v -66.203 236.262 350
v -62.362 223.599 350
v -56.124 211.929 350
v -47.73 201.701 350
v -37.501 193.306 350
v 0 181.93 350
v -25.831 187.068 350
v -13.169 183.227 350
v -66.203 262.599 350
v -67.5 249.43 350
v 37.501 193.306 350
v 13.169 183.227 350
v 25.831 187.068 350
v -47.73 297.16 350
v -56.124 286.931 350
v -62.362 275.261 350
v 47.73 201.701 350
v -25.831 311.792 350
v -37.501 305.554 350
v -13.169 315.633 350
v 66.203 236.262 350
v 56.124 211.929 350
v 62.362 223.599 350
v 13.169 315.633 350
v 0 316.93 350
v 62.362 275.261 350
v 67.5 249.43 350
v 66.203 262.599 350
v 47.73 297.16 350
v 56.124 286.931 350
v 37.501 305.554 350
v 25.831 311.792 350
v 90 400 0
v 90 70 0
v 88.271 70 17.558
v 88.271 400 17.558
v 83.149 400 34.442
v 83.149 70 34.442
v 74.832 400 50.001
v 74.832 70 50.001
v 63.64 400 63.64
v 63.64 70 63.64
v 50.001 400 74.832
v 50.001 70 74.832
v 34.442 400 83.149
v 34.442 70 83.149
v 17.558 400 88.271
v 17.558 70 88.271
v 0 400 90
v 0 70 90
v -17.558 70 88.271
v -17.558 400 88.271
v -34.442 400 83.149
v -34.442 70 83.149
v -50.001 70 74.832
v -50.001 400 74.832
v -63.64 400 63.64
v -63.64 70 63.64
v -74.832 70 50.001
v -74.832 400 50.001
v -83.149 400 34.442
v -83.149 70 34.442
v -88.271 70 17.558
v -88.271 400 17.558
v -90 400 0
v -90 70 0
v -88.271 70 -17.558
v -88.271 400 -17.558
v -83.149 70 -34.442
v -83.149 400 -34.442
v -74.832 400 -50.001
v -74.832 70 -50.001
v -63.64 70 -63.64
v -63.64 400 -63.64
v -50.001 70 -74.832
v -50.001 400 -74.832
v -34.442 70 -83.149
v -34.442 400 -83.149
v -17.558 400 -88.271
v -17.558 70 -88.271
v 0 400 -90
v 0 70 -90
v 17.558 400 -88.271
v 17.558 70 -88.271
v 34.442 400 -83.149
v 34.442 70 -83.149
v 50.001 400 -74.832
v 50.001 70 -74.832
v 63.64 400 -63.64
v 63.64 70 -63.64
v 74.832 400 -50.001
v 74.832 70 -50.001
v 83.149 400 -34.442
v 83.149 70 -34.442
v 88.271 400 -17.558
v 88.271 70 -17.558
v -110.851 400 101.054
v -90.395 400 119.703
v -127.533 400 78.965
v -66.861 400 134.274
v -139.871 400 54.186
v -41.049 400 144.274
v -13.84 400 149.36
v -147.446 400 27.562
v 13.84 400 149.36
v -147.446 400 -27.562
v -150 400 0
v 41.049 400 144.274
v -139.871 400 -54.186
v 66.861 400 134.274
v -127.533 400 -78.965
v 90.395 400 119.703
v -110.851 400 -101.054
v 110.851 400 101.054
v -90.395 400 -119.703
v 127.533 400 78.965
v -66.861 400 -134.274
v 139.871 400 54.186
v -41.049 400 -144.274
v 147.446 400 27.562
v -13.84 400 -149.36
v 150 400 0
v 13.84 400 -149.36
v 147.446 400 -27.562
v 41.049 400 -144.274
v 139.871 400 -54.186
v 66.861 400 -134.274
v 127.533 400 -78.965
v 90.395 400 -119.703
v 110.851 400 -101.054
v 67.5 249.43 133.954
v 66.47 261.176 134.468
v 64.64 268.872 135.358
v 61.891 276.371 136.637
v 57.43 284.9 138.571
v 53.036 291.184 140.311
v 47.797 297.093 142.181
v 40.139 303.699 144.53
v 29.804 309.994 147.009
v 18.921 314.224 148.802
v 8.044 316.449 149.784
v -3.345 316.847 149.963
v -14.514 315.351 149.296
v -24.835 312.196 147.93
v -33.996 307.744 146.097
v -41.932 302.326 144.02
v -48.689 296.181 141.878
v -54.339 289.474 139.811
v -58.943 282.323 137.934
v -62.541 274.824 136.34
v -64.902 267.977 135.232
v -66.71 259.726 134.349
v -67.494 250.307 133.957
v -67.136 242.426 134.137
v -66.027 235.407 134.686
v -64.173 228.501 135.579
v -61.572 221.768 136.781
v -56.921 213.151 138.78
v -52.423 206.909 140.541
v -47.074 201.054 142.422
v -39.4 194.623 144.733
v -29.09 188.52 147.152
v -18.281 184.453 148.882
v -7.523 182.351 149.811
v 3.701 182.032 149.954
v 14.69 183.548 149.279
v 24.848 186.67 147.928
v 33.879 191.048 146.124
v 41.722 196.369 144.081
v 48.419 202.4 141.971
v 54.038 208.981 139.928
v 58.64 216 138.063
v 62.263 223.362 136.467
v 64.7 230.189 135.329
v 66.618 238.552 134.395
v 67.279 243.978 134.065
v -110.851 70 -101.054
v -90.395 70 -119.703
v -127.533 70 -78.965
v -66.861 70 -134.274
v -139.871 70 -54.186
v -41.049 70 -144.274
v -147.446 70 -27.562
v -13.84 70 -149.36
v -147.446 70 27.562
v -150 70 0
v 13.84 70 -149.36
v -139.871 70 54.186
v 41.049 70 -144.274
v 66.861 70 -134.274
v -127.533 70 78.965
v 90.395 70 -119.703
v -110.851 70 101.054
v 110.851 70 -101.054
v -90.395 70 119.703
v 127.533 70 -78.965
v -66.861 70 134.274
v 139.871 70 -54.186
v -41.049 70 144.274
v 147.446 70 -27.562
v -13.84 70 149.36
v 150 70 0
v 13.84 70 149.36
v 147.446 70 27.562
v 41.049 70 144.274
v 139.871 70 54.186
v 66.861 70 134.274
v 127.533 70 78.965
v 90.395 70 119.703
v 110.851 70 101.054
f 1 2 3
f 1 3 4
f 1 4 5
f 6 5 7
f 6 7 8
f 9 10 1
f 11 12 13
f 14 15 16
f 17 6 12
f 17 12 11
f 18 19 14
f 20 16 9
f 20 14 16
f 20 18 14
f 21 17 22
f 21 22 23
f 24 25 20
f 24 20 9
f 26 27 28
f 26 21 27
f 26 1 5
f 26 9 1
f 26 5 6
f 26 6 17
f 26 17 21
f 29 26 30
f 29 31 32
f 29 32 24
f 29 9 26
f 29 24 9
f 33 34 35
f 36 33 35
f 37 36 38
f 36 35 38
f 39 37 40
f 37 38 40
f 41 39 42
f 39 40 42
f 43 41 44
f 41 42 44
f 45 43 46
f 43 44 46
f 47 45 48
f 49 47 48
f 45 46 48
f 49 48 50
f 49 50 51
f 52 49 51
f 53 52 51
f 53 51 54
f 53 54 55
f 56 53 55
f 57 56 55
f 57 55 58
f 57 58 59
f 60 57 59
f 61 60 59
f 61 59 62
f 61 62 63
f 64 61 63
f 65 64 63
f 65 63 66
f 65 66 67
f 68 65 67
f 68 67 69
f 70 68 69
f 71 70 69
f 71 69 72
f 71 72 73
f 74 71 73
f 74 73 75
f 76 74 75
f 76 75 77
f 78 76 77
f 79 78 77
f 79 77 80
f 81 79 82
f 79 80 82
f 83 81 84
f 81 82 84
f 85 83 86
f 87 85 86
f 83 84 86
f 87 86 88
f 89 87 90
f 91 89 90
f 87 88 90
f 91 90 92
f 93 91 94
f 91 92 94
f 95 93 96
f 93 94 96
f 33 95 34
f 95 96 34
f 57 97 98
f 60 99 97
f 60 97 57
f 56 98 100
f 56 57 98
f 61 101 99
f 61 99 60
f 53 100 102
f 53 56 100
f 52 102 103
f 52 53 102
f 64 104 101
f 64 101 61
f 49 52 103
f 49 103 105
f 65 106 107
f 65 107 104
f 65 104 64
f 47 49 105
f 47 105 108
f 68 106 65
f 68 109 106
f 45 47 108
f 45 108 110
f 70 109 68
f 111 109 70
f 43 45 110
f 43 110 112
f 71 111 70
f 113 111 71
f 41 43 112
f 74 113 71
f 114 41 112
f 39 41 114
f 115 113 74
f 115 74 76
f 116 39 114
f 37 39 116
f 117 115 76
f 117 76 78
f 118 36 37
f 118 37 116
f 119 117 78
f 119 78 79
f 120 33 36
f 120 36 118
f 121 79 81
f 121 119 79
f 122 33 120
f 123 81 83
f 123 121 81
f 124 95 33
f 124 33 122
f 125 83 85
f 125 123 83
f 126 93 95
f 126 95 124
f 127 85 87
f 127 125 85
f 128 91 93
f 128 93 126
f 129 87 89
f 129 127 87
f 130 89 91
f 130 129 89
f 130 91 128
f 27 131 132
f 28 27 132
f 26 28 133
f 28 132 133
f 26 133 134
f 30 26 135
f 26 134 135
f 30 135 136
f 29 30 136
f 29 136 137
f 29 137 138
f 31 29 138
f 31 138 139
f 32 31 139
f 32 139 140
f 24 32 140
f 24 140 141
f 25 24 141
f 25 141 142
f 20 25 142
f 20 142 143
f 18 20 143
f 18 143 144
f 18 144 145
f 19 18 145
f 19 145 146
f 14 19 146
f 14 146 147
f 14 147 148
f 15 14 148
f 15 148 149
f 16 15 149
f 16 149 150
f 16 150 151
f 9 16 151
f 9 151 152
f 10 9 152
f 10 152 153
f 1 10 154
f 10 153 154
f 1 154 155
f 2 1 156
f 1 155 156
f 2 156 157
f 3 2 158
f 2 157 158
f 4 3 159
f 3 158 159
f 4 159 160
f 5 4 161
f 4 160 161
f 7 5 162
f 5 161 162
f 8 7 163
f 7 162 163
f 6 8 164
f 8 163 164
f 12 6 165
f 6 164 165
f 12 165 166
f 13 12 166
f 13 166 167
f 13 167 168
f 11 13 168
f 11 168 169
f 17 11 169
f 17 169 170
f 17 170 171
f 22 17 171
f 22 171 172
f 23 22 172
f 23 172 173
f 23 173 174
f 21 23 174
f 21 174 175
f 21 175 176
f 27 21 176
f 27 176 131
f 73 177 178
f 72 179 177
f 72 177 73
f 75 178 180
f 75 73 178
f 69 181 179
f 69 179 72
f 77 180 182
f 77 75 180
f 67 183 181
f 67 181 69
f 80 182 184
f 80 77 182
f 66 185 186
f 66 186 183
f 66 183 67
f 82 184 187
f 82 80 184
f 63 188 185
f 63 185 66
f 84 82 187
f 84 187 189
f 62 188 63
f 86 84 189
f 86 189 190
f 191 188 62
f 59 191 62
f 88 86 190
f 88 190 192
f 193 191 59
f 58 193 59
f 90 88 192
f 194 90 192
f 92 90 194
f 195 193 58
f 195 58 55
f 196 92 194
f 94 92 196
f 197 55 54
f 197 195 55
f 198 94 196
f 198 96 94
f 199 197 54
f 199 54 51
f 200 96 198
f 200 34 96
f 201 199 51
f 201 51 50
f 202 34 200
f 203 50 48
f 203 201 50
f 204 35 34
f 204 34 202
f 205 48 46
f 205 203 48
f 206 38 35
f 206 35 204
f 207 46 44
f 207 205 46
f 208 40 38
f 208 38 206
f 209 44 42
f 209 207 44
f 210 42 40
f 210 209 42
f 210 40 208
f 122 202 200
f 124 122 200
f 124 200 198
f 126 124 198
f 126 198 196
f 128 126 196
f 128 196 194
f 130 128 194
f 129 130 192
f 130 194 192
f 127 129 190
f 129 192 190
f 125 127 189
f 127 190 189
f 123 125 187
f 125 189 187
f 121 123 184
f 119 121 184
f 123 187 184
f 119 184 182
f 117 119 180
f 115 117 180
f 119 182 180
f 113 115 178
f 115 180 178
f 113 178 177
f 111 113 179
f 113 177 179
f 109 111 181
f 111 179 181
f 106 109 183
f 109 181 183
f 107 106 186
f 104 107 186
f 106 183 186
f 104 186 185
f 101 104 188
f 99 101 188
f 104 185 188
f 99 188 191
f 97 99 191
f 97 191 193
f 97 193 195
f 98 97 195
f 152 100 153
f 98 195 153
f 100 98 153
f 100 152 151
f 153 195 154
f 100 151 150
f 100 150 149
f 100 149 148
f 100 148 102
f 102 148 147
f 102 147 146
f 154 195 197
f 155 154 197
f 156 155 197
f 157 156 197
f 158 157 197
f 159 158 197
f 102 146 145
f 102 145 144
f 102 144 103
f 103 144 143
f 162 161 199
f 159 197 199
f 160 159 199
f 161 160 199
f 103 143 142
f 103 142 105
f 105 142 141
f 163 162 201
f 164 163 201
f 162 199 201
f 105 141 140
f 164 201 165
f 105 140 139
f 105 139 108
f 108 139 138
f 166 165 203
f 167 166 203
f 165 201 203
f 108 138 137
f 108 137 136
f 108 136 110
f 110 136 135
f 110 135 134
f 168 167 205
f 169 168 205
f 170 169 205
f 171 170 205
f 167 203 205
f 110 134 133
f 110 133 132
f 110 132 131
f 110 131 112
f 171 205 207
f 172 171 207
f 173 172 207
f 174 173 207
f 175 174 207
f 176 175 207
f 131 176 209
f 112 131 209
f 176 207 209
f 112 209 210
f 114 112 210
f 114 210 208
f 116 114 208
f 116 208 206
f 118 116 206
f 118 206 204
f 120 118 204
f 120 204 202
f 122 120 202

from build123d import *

# Parameters (mm, degrees)
SKETCH1_R           = 150
BOSS_EXTRUDE1_DEPTH = 500
SKETCH2_R           = 150
SKETCH2_R_2         = 90
CUT_EXTRUDE1_DEPTH  = 70
SKETCH4_R           = 67.5
BOSS_EXTRUDE2_DEPTH = 350
SKETCH5_R           = 150
CUT_EXTRUDE3_DEPTH  = 100
SKETCH6_R           = 90
CUT_EXTRUDE4_DEPTH  = 401.0000001


with BuildPart() as part:
    # Sketch1 → Boss-Extrude1 (new body)
    with BuildSketch(Plane(origin=(0, 0, 0), x_dir=(1, 0, 0), z_dir=(0, 1, 0))):
        Circle(SKETCH1_R)
    extrude(amount=BOSS_EXTRUDE1_DEPTH)

    # Sketch2 → Cut-Extrude1 (cut)
    with BuildSketch(Plane.XZ):
        Circle(SKETCH2_R)
        Circle(SKETCH2_R_2, mode=Mode.SUBTRACT)
    extrude(amount=-CUT_EXTRUDE1_DEPTH, mode=Mode.SUBTRACT)

    # Sketch4 → Boss-Extrude2 (add)
    with BuildSketch(Plane.XY):
        with Locations((0, 249.430268714)):
            Circle(SKETCH4_R)
    extrude(amount=BOSS_EXTRUDE2_DEPTH)

    # Sketch5 → Cut-Extrude3 (cut)
    with BuildSketch(Plane(origin=(0, 500, 0), x_dir=(1, 0, 0), z_dir=(0, 1, 0))):
        Circle(SKETCH5_R)
    extrude(amount=-CUT_EXTRUDE3_DEPTH, mode=Mode.SUBTRACT)

    # Sketch6 → Cut-Extrude4 (cut, through all)
    with BuildSketch(Plane.XZ):
        Circle(SKETCH6_R)
    extrude(amount=-CUT_EXTRUDE4_DEPTH, mode=Mode.SUBTRACT)


solid = part.part
